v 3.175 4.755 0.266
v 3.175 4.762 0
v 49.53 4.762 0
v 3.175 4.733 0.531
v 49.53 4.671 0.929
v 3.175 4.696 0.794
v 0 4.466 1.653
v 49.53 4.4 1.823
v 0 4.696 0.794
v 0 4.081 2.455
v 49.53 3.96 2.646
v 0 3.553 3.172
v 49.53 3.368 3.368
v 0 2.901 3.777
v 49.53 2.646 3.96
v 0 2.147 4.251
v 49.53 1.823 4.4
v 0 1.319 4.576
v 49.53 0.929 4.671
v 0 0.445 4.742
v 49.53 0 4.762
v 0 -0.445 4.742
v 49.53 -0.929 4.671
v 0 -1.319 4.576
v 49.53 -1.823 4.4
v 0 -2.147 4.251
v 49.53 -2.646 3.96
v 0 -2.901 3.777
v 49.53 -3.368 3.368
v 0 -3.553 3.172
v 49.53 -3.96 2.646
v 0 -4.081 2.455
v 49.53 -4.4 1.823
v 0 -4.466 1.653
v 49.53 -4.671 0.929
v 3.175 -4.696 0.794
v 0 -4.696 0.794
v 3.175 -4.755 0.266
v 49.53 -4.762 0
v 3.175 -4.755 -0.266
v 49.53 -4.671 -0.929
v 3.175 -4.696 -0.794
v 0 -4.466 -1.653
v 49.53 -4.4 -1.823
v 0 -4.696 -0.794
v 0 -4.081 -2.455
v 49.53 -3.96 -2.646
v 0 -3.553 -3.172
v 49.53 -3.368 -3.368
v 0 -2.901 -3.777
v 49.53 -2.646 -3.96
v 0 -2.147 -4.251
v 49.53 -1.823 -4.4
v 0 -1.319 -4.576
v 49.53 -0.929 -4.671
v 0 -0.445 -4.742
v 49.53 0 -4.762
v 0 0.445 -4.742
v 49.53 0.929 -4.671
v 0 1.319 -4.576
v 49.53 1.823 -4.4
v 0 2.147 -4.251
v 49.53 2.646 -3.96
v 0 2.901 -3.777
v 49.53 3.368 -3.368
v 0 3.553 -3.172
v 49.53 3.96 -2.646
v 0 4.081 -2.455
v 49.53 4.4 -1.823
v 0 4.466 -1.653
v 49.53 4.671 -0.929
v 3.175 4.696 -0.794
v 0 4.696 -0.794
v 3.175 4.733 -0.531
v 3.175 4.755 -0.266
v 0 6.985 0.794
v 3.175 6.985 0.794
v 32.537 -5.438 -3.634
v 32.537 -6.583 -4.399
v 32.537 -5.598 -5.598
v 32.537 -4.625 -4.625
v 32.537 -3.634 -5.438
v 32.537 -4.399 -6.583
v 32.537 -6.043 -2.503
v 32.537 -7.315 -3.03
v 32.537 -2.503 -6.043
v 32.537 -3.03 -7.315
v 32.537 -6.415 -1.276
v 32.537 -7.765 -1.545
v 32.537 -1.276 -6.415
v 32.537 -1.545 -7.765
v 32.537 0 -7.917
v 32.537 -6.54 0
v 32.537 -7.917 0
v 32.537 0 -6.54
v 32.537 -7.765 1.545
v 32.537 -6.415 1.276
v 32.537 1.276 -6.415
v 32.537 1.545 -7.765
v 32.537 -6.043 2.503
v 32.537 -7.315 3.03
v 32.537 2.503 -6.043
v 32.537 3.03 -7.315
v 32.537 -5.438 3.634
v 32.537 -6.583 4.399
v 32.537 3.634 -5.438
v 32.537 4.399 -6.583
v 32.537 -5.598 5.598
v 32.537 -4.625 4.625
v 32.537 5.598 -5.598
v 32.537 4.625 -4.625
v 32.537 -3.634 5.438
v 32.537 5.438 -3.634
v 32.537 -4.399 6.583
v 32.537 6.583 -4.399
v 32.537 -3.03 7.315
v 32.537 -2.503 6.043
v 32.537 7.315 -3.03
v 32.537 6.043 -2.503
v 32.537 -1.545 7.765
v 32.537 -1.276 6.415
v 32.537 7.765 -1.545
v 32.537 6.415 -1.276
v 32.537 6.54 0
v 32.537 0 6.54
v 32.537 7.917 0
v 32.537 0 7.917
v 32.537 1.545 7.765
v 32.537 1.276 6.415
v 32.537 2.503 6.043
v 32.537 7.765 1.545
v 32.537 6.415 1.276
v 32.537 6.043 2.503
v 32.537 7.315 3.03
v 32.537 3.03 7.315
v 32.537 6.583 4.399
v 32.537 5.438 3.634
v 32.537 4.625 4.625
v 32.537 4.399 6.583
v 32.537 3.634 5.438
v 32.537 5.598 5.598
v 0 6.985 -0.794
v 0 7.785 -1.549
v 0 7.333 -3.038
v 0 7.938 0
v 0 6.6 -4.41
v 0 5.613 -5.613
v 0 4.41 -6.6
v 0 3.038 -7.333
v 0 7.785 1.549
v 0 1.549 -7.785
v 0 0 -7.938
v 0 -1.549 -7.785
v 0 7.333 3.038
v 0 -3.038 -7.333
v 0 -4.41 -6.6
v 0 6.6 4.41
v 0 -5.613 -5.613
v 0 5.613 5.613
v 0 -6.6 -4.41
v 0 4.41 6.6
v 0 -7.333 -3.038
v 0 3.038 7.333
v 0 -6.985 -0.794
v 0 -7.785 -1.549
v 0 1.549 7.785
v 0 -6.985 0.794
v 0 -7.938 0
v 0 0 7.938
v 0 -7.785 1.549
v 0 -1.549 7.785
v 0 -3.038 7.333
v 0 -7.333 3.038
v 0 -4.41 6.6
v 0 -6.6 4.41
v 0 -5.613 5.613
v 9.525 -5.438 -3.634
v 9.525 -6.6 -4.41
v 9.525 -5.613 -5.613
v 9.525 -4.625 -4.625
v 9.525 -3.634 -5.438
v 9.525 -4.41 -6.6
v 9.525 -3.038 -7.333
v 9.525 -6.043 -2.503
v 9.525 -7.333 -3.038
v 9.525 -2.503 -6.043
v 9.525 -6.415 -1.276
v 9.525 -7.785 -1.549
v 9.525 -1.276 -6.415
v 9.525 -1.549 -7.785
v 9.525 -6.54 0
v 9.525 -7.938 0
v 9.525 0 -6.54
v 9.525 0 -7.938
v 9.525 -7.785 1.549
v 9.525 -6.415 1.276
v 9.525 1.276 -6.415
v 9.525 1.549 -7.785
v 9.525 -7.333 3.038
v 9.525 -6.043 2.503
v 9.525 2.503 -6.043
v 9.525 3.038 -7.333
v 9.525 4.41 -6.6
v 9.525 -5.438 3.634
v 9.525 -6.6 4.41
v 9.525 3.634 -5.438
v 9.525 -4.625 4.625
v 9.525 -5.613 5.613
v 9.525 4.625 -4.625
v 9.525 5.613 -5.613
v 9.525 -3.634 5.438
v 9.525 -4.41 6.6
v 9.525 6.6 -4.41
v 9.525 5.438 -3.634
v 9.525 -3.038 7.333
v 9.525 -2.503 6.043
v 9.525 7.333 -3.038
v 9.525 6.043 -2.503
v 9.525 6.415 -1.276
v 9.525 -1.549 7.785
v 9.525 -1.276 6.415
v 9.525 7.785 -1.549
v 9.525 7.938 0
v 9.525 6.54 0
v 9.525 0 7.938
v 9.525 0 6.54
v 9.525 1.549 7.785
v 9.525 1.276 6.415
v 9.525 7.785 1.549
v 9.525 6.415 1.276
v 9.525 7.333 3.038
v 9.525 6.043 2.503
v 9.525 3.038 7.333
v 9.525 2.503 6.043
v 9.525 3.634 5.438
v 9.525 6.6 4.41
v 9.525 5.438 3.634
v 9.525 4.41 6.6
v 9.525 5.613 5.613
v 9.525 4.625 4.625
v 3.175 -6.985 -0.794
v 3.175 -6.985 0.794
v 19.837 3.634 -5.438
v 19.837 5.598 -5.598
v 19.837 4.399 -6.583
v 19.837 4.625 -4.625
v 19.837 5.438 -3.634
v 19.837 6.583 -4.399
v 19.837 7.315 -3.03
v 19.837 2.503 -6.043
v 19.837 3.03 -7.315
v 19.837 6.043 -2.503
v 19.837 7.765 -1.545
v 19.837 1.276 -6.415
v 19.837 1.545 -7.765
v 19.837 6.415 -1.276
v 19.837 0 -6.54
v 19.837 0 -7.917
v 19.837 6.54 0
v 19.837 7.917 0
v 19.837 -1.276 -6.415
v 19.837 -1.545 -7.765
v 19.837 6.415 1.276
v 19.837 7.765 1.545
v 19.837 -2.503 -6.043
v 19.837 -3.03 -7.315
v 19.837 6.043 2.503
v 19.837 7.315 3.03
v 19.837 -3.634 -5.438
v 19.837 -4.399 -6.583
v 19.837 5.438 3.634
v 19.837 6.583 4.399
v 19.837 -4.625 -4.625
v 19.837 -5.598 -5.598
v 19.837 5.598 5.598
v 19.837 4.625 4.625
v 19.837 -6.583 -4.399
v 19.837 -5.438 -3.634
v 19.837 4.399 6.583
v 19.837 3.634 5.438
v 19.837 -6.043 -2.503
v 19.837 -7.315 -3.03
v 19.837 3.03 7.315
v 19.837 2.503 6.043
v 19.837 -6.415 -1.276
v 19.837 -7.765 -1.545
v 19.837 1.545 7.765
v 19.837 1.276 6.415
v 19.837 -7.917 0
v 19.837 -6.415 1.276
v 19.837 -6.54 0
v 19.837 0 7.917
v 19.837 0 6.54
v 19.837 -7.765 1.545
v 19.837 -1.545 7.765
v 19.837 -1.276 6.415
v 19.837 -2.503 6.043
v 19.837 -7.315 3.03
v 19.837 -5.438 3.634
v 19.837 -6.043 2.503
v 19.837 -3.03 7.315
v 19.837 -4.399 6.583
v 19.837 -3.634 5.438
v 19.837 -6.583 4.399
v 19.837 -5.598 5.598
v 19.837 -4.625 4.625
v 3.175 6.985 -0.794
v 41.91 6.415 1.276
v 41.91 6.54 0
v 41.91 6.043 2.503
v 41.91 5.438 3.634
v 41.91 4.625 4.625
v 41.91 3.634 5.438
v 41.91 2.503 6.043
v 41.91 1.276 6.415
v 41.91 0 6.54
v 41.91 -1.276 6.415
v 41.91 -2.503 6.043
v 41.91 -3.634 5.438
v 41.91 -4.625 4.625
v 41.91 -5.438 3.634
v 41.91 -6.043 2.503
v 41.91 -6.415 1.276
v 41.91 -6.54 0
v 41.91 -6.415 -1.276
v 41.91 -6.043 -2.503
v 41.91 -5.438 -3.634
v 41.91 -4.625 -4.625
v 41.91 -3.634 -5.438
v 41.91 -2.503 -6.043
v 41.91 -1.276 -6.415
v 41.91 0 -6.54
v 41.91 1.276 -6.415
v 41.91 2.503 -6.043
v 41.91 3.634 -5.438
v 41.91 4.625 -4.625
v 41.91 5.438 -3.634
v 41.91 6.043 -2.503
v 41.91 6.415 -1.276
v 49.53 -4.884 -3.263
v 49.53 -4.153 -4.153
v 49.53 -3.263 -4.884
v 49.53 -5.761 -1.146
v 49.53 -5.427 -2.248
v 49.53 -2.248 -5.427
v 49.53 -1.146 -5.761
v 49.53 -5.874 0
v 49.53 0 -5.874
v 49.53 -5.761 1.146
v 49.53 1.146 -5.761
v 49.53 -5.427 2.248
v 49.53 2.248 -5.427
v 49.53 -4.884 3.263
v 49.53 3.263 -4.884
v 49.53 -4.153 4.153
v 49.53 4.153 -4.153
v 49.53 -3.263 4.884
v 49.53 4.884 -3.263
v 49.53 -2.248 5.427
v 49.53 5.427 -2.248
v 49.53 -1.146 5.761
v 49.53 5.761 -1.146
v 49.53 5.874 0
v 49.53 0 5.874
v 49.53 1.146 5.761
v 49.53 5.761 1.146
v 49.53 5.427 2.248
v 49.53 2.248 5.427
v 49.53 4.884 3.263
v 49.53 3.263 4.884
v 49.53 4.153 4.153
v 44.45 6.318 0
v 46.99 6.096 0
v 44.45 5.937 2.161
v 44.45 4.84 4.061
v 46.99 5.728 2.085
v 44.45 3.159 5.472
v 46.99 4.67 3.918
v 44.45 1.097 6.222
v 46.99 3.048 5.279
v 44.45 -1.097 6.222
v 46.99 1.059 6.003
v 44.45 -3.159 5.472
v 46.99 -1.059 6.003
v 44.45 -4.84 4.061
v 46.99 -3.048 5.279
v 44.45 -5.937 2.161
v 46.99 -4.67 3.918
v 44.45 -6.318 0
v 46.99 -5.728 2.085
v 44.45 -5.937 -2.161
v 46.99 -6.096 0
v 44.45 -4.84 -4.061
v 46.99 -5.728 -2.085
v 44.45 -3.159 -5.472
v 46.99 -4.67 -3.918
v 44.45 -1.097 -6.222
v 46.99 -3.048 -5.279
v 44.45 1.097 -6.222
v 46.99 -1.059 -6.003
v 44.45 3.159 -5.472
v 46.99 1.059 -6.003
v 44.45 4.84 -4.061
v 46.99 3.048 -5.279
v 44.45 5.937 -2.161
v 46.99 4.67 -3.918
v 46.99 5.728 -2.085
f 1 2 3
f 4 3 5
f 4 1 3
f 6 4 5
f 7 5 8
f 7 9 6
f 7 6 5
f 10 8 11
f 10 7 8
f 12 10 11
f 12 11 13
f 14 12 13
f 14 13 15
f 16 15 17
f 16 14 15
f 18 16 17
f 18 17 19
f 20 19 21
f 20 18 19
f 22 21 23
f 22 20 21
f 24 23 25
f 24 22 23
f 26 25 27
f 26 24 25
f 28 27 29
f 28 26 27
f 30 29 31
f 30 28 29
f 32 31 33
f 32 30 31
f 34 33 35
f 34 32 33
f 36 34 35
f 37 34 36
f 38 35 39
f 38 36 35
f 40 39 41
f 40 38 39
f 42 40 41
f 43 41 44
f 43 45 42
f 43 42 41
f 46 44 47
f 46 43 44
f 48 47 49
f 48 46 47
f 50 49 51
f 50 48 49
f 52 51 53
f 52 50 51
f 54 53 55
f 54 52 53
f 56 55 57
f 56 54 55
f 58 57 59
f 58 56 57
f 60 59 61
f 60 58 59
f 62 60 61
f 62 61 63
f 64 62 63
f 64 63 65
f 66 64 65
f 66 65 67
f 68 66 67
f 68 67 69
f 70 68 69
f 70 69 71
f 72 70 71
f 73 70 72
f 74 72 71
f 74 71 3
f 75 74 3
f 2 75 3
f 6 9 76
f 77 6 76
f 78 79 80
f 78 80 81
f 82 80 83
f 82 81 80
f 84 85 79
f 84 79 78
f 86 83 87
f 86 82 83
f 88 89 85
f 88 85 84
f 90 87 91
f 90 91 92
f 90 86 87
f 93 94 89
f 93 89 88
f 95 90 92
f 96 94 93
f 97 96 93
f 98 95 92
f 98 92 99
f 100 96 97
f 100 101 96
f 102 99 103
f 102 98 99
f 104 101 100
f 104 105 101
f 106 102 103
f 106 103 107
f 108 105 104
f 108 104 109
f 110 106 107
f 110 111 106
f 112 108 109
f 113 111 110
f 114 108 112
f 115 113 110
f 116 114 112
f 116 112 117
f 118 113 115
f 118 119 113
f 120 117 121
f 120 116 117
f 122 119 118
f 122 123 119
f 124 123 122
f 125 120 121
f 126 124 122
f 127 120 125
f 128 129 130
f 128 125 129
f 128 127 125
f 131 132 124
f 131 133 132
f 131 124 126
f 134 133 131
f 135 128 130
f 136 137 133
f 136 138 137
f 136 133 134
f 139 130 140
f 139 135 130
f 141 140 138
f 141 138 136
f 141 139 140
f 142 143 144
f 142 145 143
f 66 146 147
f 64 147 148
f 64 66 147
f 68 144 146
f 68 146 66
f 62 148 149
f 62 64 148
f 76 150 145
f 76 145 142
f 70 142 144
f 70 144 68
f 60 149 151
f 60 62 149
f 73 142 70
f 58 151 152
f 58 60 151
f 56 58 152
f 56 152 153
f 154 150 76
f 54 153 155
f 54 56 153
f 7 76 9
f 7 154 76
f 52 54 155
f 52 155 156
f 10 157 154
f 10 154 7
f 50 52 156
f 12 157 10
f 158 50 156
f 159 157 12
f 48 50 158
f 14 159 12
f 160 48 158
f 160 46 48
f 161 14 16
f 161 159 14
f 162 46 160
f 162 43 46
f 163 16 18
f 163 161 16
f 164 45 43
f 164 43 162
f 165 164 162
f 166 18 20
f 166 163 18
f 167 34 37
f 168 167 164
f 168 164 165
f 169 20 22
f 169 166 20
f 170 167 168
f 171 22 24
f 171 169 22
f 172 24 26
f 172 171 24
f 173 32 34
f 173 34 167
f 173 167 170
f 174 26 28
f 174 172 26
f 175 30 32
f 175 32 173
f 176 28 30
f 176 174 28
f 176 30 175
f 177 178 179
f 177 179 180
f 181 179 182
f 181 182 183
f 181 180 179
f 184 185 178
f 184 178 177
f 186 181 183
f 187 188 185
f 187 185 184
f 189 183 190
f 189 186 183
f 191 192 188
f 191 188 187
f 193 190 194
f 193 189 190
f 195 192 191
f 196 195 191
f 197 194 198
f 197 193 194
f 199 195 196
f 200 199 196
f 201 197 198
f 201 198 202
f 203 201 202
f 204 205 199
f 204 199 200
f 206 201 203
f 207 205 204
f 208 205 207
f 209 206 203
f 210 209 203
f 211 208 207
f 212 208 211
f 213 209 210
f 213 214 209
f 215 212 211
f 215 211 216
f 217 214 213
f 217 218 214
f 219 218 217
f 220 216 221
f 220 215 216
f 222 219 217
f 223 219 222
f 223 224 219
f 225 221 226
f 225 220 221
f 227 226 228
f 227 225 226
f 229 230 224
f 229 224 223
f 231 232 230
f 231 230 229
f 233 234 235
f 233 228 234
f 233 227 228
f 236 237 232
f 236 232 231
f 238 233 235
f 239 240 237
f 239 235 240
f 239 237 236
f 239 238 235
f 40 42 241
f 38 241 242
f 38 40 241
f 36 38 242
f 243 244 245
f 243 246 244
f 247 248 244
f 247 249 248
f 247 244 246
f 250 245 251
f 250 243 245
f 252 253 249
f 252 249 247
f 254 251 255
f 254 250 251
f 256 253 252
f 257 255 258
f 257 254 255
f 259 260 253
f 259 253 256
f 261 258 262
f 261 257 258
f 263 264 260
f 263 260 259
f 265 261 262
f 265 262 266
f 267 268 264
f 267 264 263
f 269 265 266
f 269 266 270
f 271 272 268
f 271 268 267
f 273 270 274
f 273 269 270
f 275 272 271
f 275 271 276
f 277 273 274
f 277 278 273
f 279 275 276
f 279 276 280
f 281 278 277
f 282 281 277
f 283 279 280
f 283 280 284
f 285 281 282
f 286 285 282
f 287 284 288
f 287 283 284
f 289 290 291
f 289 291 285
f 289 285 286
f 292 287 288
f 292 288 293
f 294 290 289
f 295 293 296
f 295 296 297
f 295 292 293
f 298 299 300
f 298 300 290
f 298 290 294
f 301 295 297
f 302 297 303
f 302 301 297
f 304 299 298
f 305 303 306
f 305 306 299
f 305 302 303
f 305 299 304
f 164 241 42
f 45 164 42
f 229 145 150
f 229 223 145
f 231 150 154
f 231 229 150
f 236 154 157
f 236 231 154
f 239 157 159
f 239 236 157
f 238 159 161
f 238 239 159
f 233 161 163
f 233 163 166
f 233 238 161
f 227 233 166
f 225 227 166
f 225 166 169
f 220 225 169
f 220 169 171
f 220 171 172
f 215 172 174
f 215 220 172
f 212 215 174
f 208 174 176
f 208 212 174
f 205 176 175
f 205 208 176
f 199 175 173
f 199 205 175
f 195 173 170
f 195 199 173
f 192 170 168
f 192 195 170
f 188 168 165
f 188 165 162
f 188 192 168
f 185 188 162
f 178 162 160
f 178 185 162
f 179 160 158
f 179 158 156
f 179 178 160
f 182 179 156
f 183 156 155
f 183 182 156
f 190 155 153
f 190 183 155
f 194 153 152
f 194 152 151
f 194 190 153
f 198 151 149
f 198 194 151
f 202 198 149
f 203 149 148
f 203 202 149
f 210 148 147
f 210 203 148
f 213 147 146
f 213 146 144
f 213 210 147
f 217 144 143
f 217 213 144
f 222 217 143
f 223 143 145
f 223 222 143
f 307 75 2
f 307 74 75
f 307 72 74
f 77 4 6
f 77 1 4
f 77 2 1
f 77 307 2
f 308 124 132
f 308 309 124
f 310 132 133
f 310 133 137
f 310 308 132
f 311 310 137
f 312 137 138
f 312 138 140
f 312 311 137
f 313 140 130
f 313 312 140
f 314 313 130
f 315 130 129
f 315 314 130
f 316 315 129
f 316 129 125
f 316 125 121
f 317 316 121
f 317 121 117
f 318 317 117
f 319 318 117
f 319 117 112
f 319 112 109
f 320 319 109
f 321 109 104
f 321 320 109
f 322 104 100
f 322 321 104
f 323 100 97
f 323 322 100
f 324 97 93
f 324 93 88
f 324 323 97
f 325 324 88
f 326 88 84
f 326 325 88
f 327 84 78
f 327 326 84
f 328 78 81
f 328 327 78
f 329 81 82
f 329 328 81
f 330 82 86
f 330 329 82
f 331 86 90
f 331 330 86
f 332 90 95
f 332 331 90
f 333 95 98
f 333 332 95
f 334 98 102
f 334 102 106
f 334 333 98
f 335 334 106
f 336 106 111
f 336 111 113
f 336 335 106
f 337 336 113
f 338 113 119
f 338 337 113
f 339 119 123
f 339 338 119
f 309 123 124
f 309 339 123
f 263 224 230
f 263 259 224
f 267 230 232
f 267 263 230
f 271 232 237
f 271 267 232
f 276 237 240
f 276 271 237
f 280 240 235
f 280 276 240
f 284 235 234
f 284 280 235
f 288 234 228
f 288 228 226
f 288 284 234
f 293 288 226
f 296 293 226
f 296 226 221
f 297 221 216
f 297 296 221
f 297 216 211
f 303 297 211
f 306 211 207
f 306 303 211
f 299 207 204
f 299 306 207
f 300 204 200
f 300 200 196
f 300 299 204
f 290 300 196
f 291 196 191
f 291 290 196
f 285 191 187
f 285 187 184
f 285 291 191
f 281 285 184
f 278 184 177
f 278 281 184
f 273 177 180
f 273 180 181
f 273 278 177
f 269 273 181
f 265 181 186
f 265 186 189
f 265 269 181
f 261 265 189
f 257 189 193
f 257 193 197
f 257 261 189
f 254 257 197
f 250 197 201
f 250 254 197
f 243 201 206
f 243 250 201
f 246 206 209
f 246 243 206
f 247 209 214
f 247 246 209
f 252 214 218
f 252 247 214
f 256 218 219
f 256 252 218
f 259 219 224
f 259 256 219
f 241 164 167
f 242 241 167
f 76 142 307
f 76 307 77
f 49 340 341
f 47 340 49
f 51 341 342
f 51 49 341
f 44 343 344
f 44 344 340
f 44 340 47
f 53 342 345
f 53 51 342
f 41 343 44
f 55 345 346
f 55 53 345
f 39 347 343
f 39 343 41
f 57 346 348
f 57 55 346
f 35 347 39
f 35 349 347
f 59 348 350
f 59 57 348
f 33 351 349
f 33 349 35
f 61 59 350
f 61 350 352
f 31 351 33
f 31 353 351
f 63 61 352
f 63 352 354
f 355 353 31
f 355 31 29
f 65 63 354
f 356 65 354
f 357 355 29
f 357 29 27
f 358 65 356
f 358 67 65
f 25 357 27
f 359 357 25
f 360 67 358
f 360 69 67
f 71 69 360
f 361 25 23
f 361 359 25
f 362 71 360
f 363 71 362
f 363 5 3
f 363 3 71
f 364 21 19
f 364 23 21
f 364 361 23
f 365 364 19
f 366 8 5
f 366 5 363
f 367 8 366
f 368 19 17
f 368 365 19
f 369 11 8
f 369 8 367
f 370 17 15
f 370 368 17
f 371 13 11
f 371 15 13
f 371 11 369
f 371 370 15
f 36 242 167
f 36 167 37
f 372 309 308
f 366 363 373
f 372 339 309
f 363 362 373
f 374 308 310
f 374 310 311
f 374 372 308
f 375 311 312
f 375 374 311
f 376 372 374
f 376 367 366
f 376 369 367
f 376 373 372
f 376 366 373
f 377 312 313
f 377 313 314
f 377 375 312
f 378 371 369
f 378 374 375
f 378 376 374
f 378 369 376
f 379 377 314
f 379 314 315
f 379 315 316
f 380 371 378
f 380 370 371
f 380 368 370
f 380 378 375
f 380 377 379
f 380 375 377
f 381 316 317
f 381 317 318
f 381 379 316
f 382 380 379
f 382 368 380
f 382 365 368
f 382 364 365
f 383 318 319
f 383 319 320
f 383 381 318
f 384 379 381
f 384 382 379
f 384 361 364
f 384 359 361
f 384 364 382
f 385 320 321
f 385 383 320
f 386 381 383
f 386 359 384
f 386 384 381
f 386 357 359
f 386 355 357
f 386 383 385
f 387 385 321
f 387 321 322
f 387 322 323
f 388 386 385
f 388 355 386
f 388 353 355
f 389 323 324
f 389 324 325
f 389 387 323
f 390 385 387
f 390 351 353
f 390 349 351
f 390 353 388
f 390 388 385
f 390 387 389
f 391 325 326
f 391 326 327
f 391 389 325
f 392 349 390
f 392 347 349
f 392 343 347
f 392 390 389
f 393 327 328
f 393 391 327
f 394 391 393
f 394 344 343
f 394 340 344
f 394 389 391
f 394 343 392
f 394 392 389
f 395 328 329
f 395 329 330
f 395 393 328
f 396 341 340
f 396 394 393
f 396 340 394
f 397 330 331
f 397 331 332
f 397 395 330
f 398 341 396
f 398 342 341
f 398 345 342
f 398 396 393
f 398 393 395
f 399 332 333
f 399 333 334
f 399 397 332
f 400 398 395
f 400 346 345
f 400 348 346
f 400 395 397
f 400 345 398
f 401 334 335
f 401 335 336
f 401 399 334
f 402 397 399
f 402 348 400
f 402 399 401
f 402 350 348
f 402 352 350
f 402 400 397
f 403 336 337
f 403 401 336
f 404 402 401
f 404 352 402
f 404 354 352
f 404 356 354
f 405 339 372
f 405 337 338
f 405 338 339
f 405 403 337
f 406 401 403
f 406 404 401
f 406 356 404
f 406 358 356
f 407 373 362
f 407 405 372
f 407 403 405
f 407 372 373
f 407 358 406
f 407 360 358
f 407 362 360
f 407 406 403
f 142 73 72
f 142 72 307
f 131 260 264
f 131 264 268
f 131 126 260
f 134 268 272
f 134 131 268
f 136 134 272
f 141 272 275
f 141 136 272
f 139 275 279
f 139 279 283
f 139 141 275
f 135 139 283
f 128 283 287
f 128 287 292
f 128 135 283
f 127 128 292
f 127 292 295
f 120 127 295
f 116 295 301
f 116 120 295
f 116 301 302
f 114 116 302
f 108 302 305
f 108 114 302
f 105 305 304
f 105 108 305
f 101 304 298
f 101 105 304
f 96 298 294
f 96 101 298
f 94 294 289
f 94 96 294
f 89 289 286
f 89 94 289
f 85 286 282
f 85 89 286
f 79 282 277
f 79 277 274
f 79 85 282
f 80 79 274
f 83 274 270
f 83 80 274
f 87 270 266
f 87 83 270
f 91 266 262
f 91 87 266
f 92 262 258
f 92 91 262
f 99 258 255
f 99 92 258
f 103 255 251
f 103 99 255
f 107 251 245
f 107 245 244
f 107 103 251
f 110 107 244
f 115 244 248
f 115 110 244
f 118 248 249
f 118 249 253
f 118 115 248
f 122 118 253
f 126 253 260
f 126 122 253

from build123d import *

# Parameters (mm, degrees)
SKETCH2_W          = 1.5875
SKETCH2_H          = 13.97
CUT_EXTRUDE1_DEPTH = 3.175


with BuildPart() as part:
    # Sketch1 → Revolve1 (revolve)
    with BuildSketch(Plane.XY):
        Polygon((0, 4.7625), (0, 7.9375), (9.525, 7.9375), (9.525, 6.5405), (19.8374, 6.5405), (19.8374, 7.91718), (32.5374, 7.91718), (32.5374, 6.5405), (41.91, 6.5405), (49.53, 5.873836384), (49.53, 4.7625), align=None)
    revolve(axis=Axis((0, 0, 0), (1, 0, 0)))

    # Sketch2 → Cut-Extrude1 (cut)
    with BuildSketch(Plane.ZY):
        Rectangle(SKETCH2_W, SKETCH2_H)
    extrude(amount=-CUT_EXTRUDE1_DEPTH, mode=Mode.SUBTRACT)


solid = part.part
